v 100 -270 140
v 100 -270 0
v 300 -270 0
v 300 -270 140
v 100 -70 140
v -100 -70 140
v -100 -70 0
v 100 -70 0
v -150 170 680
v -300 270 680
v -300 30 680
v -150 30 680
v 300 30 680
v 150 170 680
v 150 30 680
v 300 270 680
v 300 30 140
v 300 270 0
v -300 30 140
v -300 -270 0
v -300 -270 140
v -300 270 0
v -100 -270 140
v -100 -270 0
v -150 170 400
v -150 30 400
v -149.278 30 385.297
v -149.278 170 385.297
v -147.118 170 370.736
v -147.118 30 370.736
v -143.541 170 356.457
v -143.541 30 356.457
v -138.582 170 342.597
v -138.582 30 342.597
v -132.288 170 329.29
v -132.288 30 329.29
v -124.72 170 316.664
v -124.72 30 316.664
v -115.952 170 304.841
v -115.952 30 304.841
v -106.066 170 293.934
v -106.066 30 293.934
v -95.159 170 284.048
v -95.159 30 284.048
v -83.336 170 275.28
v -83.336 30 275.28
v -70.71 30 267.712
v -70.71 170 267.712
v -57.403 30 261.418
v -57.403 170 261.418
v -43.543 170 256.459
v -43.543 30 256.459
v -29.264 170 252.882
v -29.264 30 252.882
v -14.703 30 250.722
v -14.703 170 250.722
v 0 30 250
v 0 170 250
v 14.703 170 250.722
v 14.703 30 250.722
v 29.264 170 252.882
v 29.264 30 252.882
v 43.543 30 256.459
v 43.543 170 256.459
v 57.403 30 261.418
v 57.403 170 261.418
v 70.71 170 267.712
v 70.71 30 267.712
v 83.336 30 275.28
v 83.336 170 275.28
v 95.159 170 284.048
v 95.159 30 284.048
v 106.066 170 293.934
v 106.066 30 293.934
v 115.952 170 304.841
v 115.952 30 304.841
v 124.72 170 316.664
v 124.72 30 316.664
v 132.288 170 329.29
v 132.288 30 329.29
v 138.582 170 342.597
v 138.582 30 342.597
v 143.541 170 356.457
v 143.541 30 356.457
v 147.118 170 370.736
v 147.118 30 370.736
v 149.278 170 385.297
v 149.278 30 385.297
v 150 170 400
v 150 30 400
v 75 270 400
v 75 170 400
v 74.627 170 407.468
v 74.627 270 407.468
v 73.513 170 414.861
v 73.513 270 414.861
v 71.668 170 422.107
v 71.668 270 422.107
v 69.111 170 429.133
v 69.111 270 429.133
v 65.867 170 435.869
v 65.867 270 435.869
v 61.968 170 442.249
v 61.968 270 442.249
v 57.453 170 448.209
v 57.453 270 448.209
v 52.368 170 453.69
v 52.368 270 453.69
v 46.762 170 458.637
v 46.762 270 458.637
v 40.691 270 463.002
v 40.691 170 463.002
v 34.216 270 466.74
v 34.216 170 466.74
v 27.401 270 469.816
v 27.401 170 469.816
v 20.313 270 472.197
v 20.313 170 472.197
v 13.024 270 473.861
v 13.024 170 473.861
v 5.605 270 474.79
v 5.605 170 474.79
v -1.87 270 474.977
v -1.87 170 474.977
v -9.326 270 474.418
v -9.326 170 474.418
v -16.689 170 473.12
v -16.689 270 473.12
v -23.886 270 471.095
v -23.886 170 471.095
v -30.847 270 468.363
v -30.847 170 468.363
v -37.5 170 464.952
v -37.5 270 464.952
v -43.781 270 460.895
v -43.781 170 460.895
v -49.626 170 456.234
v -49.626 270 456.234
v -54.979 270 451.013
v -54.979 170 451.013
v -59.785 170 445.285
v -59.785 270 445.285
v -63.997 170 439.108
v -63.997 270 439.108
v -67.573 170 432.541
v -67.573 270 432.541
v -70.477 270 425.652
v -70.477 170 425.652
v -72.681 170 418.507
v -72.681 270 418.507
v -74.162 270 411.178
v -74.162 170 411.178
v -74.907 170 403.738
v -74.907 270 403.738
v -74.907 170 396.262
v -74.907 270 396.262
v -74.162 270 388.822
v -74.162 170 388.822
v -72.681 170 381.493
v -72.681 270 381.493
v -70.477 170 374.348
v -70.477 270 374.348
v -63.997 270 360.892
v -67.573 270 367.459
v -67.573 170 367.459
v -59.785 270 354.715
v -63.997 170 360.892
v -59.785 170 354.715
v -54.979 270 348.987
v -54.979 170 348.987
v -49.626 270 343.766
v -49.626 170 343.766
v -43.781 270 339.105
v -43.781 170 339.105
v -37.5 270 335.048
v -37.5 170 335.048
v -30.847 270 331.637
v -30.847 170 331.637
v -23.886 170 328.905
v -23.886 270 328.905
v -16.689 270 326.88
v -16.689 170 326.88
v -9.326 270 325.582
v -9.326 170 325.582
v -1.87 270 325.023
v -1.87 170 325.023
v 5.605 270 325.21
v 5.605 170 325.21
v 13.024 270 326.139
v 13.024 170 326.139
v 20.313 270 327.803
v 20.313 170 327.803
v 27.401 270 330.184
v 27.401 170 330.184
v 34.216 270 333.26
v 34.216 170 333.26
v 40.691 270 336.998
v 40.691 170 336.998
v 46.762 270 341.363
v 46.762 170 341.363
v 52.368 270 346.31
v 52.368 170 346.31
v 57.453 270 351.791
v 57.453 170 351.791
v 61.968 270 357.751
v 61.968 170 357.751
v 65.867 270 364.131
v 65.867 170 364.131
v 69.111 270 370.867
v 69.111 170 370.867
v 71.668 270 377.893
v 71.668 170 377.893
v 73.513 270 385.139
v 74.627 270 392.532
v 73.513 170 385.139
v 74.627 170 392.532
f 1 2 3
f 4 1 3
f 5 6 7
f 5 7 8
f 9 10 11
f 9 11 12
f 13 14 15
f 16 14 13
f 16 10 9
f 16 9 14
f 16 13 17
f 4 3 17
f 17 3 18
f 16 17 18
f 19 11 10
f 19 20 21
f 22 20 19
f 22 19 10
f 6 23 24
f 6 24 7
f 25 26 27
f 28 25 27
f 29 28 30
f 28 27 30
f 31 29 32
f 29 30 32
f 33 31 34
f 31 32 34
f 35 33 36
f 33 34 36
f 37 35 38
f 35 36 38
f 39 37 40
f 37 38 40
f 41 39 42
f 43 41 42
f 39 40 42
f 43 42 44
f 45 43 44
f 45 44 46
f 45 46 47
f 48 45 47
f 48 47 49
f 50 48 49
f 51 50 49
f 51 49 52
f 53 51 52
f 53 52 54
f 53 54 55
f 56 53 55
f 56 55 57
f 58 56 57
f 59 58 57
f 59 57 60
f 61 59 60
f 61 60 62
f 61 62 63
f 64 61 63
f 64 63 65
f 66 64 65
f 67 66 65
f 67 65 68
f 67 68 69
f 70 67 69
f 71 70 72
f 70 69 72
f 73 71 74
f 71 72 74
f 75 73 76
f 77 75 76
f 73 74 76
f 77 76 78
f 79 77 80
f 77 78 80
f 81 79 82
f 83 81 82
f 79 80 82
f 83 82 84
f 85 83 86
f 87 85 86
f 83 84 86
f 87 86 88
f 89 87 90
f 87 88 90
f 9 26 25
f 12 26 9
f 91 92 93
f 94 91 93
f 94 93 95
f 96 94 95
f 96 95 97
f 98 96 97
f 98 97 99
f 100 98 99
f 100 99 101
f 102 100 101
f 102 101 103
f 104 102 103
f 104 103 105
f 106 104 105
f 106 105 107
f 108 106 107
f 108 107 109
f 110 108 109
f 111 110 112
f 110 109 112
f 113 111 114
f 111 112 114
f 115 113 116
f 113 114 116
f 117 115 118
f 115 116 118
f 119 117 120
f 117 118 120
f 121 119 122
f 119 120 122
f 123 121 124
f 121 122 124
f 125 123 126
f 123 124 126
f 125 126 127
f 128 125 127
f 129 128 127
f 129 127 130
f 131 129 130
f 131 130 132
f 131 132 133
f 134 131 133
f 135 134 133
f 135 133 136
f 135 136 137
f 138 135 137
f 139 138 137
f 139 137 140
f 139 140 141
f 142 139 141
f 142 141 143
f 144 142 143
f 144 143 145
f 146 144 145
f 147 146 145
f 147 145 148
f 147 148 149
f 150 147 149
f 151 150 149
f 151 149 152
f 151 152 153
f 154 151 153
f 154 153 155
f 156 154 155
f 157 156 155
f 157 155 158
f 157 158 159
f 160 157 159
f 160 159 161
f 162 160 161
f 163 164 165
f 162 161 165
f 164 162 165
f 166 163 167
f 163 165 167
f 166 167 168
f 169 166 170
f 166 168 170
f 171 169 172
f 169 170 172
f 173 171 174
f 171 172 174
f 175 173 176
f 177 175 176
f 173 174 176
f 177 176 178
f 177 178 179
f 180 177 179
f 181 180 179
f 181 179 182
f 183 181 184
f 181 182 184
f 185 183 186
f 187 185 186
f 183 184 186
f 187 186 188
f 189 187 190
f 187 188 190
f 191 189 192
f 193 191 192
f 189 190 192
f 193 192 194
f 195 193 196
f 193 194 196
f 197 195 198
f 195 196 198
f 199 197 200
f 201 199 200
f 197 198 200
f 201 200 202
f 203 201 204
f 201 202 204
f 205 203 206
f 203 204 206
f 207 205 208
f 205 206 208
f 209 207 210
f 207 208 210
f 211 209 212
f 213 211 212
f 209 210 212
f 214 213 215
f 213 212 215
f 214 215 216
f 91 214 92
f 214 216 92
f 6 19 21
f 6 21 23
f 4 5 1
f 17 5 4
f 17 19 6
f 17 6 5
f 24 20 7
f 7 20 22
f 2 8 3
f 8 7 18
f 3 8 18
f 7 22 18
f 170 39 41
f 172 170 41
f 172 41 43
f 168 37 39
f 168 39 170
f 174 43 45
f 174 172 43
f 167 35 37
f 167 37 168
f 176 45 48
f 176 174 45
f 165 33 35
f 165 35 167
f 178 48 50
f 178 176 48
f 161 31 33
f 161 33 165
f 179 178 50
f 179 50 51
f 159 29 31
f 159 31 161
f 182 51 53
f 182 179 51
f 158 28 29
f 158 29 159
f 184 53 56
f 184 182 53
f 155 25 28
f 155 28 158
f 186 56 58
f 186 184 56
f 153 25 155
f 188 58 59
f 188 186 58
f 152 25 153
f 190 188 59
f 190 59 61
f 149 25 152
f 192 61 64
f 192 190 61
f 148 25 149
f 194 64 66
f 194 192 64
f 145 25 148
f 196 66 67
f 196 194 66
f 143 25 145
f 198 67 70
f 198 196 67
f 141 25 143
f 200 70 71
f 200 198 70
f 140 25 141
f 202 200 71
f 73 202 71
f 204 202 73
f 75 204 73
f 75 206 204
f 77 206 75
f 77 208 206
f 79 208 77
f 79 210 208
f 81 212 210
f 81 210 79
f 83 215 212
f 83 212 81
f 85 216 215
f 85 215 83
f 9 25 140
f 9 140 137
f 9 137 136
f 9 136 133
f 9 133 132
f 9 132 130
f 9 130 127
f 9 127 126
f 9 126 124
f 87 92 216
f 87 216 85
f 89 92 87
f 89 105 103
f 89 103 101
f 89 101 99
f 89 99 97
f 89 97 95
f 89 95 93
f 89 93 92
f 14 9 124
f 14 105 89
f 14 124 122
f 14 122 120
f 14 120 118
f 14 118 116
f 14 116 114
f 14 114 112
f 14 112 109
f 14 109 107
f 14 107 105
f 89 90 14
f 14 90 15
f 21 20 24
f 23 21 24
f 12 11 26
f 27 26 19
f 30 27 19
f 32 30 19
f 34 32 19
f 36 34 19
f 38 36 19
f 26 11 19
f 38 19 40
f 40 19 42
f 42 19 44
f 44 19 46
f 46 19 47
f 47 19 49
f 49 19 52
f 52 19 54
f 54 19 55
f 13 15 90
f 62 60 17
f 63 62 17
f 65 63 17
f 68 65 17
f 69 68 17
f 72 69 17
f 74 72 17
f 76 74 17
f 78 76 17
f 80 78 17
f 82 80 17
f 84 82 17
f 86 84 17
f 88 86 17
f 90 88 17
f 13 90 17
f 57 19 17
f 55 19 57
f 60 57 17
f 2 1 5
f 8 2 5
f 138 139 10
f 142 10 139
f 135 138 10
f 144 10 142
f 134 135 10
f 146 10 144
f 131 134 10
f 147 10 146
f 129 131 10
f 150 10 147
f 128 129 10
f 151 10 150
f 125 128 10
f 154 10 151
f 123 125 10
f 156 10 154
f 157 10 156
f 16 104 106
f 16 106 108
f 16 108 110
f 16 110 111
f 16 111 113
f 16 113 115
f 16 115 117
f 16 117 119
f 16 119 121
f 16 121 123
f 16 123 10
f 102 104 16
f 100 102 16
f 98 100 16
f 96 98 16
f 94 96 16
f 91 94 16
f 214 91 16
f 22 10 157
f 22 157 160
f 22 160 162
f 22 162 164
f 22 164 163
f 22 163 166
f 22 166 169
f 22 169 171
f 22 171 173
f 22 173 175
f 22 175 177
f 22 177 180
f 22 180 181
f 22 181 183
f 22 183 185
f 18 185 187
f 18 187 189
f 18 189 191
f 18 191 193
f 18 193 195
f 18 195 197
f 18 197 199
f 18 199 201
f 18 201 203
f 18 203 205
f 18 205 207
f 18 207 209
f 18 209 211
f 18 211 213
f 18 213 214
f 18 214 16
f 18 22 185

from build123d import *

# Parameters (mm, degrees)
F0_W      = 600
F0_H      = 540
F1_DEPTH  = 140
F2_W      = 200
F2_H      = 200
F3_DEPTH  = 140.001
F4_W      = 600
F4_H      = 240
F5_DEPTH  = 540
F6_W      = 300
F6_H      = 560
F7_DEPTH  = 140
F9_R      = 75
F10_DEPTH = 100.001
F8_R      = 150
F11_DEPTH = 140


with BuildPart() as f1:
    # F0 (on Top) → F1 (new body)
    with BuildSketch(Plane.XY):
        Rectangle(F0_W, F0_H)
    extrude(amount=F1_DEPTH)

    # F2 (on face) → F3 (cut, through all)
    with BuildSketch(Plane.XY.offset(140)):
        with Locations((0, -170)):
            Rectangle(F2_W, F2_H)
    extrude(amount=-F3_DEPTH, mode=Mode.SUBTRACT)

    # F4 (on face) → F5 (join)
    with BuildSketch(Plane.XY.offset(140)):
        with Locations((0, 150)):
            Rectangle(F4_W, F4_H)
    extrude(amount=F5_DEPTH)

    # F6 (on face) → F7 (cut)
    with BuildSketch(Plane.XZ.offset(-30)):
        with Locations((0, 680)):
            Rectangle(F6_W, F6_H)
    extrude(amount=-F7_DEPTH, mode=Mode.SUBTRACT)

    # F9 (on face) → F10 (cut, through all)
    with BuildSketch(Plane.XZ.offset(-170)):
        with Locations((0, 400)):
            Circle(F9_R)
    extrude(amount=-F10_DEPTH, mode=Mode.SUBTRACT)

    # F8 (on face) → F11 (cut)
    with BuildSketch(Plane.XZ.offset(-30)):
        with Locations((0, 400)):
            Circle(F8_R)
    extrude(amount=-F11_DEPTH, mode=Mode.SUBTRACT)


solid = f1.part
